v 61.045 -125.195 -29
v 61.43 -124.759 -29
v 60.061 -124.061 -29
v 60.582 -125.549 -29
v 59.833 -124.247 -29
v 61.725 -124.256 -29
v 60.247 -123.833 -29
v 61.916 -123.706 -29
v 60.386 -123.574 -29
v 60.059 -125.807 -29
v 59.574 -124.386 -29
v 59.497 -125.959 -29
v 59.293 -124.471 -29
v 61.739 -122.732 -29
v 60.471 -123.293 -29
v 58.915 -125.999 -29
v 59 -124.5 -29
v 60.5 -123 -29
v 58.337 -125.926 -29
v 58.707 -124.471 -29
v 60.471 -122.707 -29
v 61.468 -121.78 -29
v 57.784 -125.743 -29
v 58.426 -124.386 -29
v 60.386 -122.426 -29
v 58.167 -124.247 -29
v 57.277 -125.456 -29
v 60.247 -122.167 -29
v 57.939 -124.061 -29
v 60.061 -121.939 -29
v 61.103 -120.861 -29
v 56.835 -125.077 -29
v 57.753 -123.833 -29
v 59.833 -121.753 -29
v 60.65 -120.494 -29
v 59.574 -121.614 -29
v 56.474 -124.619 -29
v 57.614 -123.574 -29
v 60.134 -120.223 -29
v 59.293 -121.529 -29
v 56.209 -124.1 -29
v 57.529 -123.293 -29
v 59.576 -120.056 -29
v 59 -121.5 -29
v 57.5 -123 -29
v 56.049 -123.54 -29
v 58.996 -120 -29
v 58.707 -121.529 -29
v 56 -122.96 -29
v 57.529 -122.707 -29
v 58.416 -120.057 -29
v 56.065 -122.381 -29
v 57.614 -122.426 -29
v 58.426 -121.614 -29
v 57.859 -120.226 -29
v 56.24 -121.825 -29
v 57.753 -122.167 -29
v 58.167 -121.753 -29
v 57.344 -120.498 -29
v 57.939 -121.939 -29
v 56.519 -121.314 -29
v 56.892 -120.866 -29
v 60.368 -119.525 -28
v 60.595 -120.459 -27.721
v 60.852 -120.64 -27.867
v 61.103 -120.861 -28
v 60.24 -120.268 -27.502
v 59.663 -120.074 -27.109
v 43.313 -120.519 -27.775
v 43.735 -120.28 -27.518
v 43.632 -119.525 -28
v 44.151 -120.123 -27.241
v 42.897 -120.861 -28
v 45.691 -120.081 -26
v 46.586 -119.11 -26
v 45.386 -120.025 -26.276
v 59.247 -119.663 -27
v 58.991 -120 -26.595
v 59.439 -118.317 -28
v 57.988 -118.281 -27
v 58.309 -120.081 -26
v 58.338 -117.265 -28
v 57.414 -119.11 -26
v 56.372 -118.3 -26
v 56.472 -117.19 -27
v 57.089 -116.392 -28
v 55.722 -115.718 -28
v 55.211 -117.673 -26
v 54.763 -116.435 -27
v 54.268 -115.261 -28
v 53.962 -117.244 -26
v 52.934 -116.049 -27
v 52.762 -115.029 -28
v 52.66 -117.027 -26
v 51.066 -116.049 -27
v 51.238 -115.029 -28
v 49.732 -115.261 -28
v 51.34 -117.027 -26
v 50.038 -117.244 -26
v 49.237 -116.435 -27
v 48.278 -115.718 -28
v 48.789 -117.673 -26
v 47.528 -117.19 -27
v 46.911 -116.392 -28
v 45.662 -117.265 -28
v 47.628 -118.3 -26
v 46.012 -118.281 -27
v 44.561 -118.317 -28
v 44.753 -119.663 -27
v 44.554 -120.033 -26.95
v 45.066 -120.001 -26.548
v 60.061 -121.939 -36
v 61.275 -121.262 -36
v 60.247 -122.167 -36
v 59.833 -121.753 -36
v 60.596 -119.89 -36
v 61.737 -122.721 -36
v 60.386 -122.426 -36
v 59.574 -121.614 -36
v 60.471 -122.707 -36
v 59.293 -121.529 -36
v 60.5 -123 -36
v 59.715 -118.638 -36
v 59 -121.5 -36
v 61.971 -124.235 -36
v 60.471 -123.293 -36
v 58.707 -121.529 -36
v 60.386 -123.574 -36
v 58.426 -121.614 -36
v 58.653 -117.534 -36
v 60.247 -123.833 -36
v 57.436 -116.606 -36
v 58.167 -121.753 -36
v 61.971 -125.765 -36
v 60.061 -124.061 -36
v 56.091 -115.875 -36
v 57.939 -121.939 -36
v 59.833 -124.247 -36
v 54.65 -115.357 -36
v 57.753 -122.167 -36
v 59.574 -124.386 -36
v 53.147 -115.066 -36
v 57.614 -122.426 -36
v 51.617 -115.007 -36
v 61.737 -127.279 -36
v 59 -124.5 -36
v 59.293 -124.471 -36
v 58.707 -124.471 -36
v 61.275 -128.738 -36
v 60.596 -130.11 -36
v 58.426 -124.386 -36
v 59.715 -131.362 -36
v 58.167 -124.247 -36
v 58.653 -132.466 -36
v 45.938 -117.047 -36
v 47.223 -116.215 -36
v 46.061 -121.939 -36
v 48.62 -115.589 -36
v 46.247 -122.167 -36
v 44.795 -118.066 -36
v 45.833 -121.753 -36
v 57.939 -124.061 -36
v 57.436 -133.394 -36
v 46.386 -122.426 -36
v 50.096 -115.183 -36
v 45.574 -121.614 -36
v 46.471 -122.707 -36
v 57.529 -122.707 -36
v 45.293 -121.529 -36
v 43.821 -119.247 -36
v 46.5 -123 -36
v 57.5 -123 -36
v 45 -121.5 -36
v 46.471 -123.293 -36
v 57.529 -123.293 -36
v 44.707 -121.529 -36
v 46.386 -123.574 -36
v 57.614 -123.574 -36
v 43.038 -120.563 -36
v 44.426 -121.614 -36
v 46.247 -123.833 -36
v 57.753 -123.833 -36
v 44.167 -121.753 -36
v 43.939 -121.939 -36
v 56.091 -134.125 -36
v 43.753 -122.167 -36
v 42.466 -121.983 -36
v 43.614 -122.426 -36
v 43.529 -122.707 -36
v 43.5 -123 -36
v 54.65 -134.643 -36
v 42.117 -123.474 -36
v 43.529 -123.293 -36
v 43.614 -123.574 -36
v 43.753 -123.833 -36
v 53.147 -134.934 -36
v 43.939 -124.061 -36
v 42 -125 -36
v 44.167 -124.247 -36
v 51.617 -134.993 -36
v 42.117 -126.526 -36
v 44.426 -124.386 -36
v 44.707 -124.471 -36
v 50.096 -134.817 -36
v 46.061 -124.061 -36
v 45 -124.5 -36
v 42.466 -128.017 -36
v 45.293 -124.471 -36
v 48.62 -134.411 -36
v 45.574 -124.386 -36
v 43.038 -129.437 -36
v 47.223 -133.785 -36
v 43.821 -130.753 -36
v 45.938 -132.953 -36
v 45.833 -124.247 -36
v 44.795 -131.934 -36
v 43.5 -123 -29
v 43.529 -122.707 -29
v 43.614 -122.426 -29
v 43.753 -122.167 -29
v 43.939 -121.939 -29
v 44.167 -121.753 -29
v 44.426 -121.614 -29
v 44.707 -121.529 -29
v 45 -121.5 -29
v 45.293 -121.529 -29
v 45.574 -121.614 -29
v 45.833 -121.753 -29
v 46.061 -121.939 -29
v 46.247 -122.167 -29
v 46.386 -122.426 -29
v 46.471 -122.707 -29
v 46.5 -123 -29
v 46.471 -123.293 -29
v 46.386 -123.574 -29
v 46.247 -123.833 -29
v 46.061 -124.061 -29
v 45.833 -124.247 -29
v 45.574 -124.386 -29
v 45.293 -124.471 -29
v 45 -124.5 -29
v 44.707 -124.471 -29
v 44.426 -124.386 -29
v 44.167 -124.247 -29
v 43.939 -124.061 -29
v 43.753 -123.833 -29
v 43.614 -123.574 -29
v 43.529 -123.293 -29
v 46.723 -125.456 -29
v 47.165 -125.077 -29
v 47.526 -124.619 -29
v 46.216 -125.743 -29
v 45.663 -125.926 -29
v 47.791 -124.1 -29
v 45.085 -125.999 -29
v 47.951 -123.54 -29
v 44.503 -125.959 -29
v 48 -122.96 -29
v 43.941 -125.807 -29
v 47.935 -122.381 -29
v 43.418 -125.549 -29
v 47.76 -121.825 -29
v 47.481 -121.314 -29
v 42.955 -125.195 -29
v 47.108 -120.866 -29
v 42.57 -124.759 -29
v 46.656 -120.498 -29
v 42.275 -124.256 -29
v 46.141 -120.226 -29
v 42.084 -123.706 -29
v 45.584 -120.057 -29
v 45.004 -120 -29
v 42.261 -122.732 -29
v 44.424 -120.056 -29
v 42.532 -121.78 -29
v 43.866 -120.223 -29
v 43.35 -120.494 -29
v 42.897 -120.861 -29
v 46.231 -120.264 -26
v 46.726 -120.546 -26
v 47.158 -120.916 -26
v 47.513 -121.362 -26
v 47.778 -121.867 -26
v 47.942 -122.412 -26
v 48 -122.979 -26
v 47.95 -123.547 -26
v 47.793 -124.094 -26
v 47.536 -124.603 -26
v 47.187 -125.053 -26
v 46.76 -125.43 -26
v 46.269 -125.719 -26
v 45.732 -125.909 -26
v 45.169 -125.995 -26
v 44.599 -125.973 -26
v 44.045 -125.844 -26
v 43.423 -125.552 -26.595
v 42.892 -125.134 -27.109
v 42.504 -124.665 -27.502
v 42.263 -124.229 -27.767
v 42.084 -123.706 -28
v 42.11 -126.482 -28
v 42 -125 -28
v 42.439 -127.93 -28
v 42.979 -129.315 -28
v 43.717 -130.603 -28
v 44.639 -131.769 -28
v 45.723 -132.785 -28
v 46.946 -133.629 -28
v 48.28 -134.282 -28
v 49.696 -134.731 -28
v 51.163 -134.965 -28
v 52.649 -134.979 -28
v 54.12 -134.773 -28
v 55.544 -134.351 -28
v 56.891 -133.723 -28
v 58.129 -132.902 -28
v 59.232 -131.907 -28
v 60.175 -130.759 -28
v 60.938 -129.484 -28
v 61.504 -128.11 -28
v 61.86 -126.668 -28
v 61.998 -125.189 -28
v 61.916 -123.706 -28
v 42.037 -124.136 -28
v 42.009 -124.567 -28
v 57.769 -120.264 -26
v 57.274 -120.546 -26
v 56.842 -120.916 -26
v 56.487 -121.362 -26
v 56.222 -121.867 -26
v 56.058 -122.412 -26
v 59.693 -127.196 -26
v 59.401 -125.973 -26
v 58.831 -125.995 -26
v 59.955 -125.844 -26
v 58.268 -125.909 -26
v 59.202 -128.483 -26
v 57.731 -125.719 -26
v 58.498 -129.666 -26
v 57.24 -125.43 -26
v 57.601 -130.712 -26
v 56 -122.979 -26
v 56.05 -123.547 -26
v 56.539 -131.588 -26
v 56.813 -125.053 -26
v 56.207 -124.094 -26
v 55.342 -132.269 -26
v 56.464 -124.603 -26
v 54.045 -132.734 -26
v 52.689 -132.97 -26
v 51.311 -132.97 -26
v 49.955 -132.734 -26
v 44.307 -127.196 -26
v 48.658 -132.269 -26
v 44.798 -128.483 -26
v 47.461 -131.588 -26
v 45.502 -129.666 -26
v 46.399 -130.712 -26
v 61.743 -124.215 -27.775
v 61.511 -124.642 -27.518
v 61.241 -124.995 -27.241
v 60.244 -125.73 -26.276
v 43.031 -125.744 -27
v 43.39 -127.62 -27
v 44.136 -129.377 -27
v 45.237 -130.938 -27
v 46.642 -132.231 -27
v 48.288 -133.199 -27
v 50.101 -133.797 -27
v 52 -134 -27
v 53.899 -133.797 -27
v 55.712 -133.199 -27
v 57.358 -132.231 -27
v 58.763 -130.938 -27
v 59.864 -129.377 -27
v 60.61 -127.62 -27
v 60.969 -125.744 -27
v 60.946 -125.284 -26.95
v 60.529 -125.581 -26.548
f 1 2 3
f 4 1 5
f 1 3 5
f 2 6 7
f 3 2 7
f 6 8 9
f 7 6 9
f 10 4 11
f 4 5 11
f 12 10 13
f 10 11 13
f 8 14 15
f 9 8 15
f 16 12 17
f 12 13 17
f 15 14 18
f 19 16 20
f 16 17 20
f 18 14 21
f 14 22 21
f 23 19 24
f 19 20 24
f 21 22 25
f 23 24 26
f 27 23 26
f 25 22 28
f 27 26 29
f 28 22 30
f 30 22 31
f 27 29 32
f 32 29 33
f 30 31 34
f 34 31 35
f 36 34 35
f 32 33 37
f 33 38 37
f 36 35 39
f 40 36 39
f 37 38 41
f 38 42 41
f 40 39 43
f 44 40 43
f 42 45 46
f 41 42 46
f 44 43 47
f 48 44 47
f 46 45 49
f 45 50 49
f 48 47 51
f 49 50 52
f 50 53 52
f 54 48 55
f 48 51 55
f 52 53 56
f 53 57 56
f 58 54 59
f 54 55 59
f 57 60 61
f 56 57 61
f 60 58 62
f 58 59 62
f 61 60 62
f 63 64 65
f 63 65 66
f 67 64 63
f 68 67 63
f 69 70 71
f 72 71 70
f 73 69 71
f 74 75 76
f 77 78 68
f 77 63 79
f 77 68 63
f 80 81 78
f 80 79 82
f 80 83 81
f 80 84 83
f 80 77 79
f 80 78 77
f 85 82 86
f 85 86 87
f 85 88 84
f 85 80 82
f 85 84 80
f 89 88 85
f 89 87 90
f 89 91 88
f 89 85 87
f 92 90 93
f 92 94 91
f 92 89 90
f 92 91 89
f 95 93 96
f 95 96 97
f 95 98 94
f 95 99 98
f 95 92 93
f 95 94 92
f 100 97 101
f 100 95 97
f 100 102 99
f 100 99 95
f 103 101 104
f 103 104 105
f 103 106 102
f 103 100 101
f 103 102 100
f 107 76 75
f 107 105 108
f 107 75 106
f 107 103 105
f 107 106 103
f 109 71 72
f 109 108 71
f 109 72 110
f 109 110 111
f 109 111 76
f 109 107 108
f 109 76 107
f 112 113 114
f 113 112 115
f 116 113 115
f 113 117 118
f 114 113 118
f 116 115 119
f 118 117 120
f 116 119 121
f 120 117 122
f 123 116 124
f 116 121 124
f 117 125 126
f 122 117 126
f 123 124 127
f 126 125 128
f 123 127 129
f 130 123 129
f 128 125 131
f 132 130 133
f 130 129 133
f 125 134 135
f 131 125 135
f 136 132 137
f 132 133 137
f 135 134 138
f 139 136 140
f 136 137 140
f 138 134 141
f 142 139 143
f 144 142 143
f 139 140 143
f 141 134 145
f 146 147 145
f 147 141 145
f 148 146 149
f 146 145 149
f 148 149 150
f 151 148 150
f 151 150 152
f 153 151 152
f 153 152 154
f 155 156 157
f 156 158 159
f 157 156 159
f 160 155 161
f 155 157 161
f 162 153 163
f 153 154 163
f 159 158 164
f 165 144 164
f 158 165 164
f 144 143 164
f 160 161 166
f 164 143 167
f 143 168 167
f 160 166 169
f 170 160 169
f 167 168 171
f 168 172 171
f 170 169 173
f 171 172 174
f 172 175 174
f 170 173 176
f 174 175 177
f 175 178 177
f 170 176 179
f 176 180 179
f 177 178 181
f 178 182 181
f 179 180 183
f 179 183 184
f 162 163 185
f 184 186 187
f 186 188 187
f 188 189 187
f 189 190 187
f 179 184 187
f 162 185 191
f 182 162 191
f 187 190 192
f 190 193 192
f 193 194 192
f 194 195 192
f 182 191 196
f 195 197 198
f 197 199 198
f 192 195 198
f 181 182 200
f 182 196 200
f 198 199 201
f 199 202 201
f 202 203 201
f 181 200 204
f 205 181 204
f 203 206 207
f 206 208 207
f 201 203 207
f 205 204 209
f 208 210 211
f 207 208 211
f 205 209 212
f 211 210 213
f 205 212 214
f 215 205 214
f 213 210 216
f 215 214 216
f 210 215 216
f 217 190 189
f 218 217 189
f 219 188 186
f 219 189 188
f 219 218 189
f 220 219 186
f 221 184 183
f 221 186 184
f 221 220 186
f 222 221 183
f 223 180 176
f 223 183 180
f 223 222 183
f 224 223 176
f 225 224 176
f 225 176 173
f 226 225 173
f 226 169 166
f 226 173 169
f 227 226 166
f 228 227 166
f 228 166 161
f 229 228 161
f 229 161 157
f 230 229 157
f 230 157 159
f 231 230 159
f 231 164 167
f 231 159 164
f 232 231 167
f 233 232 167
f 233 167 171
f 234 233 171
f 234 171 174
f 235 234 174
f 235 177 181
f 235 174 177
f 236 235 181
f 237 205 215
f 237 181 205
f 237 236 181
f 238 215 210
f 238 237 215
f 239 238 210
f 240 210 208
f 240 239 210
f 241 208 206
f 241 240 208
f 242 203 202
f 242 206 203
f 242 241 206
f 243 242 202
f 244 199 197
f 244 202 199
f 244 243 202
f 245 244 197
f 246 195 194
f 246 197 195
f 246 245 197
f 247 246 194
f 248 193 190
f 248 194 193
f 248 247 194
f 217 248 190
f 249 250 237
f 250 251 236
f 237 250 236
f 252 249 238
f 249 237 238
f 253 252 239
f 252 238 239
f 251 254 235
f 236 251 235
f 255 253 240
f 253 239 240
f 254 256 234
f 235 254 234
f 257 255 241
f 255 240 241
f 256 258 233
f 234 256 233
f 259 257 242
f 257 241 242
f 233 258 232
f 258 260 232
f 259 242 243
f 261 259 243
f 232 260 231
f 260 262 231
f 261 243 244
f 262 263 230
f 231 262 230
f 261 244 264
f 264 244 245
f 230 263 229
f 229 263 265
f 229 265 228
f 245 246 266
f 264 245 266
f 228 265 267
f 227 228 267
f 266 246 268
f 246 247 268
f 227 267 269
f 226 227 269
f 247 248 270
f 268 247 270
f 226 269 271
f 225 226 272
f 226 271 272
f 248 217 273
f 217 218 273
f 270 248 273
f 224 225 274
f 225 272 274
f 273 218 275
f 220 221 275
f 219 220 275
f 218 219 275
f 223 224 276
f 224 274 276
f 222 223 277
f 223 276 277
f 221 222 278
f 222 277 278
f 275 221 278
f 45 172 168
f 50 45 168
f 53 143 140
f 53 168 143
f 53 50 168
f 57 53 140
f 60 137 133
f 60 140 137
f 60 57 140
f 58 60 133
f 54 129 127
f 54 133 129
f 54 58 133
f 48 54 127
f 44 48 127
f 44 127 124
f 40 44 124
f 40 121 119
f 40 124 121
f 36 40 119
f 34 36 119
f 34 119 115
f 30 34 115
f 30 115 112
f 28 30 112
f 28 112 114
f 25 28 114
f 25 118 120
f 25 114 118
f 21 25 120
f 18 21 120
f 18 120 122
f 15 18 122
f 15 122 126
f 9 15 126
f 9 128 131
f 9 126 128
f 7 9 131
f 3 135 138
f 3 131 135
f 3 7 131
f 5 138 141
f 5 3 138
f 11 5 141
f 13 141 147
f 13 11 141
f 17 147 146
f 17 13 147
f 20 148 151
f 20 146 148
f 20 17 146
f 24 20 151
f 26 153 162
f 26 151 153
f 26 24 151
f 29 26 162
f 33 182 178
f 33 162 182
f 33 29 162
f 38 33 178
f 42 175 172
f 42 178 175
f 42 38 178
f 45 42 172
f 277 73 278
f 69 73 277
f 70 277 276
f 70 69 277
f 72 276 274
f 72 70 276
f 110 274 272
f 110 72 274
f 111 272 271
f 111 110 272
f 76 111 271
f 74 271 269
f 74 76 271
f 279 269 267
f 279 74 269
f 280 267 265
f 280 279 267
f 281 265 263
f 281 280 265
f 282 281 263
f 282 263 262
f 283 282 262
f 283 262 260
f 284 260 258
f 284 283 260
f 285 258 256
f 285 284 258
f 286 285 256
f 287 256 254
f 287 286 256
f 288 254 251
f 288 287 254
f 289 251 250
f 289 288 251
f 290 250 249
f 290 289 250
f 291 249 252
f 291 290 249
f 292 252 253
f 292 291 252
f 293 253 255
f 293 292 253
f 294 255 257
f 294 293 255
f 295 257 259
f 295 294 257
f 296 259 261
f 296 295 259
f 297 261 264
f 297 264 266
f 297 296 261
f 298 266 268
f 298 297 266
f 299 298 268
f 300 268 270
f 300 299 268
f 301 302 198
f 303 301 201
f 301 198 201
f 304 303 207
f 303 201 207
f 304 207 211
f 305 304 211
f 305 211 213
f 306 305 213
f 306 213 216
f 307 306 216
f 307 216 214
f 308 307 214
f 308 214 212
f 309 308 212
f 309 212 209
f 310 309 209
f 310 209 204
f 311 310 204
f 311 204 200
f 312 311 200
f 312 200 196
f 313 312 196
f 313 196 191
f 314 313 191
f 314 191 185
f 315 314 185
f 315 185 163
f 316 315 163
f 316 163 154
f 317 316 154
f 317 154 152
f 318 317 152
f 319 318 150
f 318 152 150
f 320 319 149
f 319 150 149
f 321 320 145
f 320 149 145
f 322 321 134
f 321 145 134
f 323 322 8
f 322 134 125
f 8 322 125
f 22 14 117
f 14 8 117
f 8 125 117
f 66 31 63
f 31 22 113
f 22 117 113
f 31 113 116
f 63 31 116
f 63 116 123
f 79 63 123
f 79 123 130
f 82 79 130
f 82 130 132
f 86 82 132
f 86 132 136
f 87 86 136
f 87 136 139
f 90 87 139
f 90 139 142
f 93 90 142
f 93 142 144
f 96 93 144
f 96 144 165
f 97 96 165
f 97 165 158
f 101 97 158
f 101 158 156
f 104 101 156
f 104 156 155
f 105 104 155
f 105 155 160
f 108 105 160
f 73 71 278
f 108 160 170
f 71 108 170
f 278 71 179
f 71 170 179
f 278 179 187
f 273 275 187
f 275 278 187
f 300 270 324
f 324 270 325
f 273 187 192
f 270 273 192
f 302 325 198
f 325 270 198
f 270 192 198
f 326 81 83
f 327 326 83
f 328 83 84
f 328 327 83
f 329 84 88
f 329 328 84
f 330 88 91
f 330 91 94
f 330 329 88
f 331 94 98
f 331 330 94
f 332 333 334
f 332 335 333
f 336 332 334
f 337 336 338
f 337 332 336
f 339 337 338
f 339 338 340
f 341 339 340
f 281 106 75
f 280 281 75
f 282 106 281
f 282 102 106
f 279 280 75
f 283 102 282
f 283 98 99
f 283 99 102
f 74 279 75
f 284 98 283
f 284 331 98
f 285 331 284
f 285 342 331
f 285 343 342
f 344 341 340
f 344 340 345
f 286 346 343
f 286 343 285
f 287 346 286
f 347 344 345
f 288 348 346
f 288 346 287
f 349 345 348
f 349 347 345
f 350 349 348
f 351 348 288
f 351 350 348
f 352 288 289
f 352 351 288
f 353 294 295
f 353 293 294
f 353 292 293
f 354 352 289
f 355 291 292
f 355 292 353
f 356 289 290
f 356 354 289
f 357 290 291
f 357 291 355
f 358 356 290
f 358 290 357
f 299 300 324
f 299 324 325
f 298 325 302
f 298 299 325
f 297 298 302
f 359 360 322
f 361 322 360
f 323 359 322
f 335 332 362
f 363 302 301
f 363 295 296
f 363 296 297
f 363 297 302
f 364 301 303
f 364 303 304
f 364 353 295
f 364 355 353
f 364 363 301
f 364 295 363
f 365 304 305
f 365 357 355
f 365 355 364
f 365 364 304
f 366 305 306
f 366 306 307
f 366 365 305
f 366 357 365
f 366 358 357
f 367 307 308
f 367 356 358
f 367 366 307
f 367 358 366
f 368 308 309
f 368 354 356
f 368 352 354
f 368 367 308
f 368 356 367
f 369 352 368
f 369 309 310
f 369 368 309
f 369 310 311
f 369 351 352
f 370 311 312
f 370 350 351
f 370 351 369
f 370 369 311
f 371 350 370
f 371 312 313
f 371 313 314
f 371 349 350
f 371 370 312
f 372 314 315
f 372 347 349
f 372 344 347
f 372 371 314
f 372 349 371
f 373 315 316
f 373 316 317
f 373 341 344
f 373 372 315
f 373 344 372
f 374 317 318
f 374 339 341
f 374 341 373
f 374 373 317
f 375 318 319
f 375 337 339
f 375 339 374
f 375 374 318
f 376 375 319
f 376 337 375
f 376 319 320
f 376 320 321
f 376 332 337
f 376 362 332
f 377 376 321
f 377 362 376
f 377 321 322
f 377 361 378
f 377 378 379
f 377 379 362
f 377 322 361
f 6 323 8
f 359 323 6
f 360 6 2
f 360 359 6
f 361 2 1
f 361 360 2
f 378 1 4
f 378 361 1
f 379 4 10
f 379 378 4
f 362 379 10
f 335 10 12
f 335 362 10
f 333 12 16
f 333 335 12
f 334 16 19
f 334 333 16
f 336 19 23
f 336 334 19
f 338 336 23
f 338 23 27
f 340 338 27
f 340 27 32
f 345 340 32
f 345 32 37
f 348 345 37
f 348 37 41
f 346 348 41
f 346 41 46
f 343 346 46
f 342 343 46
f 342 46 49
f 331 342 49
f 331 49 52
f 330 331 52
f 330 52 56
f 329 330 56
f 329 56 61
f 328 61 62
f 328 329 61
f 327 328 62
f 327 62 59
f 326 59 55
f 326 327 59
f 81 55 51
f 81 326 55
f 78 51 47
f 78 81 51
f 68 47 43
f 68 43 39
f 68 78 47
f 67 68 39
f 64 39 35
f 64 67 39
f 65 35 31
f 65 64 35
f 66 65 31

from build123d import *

# Parameters (mm, degrees)
CYLINDER2357_R              = 1.5
CYLINDER2357_DEPTH          = 20
CYLINDER2367_R              = 1.5
CYLINDER2367_DEPTH          = 20
CYLINDER2363_R              = 1.5
CYLINDER2363_DEPTH          = 20
CYLINDER2378_R              = 1.5
CYLINDER2378_DEPTH          = 20
COMPOUND999_PLACEMENT_ANGLE = 90
CYLINDER2373_R              = 3
CYLINDER2373_DEPTH          = 4
CYLINDER2360_R              = 3
CYLINDER2360_DEPTH          = 4
CYLINDER2362_R              = 3
CYLINDER2362_DEPTH          = 4
CYLINDER2361_R              = 3
CYLINDER2361_DEPTH          = 4
COMPOUND994_PLACEMENT_ANGLE = 90
CYLINDER2359_R              = 10
CYLINDER2359_DEPTH          = 10
CHAMFER057_SIZE             = 2
CUT596_PLACEMENT_ANGLE      = 180


with BuildPart() as v_lec2357:
    # Cylinder2357 → Cylinder2357 (new body)
    with BuildSketch(Plane(origin=(-7, -34, 37), x_dir=(1, 0, 0), z_dir=(0, -1, 0))):
        Circle(CYLINDER2357_R)
    extrude(amount=CYLINDER2357_DEPTH)


with BuildPart() as v_lec2367:
    # Cylinder2367 → Cylinder2367 (new body)
    with BuildSketch(Plane(origin=(7, -34, 73), x_dir=(1, 0, 0), z_dir=(0, -1, 0))):
        Circle(CYLINDER2367_R)
    extrude(amount=CYLINDER2367_DEPTH)


with BuildPart() as v_lec2363:
    # Cylinder2363 → Cylinder2363 (new body)
    with BuildSketch(Plane(origin=(-7, -34, 73), x_dir=(1, 0, 0), z_dir=(0, -1, 0))):
        Circle(CYLINDER2363_R)
    extrude(amount=CYLINDER2363_DEPTH)


with BuildPart() as compound999:
    # Cylinder2378 → Cylinder2378 (new body)
    with BuildSketch(Plane(origin=(7, -34, 37), x_dir=(1, 0, 0), z_dir=(0, -1, 0))):
        Circle(CYLINDER2378_R)
    extrude(amount=CYLINDER2378_DEPTH)

    # Compound999: union Válec2357, Válec2367, Válec2363
    add(v_lec2357.part)
    add(v_lec2367.part)
    add(v_lec2363.part)


with BuildPart() as compound999_1:
    # Compound999 placement: moved
    add(compound999.part.moved(Location((0, 141, 45))).rotate(Axis((0, 141, 45), (1, 0, 0)), COMPOUND999_PLACEMENT_ANGLE))


with BuildPart() as v_lec2373:
    # Cylinder2373 → Cylinder2373 (new body)
    with BuildSketch(Plane(origin=(-7, -34, 37), x_dir=(1, 0, 0), z_dir=(0, -1, 0))):
        Circle(CYLINDER2373_R)
    extrude(amount=CYLINDER2373_DEPTH)


with BuildPart() as v_lec2360:
    # Cylinder2360 → Cylinder2360 (new body)
    with BuildSketch(Plane(origin=(7, -34, 73), x_dir=(1, 0, 0), z_dir=(0, -1, 0))):
        Circle(CYLINDER2360_R)
    extrude(amount=CYLINDER2360_DEPTH)


with BuildPart() as v_lec2362:
    # Cylinder2362 → Cylinder2362 (new body)
    with BuildSketch(Plane(origin=(-7, -34, 73), x_dir=(1, 0, 0), z_dir=(0, -1, 0))):
        Circle(CYLINDER2362_R)
    extrude(amount=CYLINDER2362_DEPTH)


with BuildPart() as compound994:
    # Cylinder2361 → Cylinder2361 (new body)
    with BuildSketch(Plane(origin=(7, -34, 37), x_dir=(1, 0, 0), z_dir=(0, -1, 0))):
        Circle(CYLINDER2361_R)
    extrude(amount=CYLINDER2361_DEPTH)

    # Compound994: union Válec2373, Válec2360, Válec2362
    add(v_lec2373.part)
    add(v_lec2360.part)
    add(v_lec2362.part)


with BuildPart() as compound994_1:
    # Compound994 placement: moved
    add(compound994.part.moved(Location((0, 141, 45))).rotate(Axis((0, 141, 45), (1, 0, 0)), COMPOUND994_PLACEMENT_ANGLE))


with BuildPart() as cut596:
    # Cylinder2359 → Cylinder2359 (new body)
    with BuildSketch(Plane(origin=(0, 106, 0), x_dir=(1, 0, 0), z_dir=(0, 0, 1))):
        Circle(CYLINDER2359_R)
    extrude(amount=CYLINDER2359_DEPTH)

    # Chamfer057
    chamfer057_edges = [cut596.edges().sort_by_distance(p)[0] for p in [
        (-10, 106, 10),
    ]]
    chamfer(chamfer057_edges, length=CHAMFER057_SIZE)

    # Cut595: cut Compound994
    add(compound994_1.part, mode=Mode.SUBTRACT)

    # Cut596: cut Compound999
    add(compound999_1.part, mode=Mode.SUBTRACT)


with BuildPart() as cut596_1:
    # Cut596 placement: moved
    add(cut596.part.moved(Location((52, -19, -36))).rotate(Axis((52, -19, -36), (0, 0, 1)), CUT596_PLACEMENT_ANGLE))


solid = cut596_1.part
